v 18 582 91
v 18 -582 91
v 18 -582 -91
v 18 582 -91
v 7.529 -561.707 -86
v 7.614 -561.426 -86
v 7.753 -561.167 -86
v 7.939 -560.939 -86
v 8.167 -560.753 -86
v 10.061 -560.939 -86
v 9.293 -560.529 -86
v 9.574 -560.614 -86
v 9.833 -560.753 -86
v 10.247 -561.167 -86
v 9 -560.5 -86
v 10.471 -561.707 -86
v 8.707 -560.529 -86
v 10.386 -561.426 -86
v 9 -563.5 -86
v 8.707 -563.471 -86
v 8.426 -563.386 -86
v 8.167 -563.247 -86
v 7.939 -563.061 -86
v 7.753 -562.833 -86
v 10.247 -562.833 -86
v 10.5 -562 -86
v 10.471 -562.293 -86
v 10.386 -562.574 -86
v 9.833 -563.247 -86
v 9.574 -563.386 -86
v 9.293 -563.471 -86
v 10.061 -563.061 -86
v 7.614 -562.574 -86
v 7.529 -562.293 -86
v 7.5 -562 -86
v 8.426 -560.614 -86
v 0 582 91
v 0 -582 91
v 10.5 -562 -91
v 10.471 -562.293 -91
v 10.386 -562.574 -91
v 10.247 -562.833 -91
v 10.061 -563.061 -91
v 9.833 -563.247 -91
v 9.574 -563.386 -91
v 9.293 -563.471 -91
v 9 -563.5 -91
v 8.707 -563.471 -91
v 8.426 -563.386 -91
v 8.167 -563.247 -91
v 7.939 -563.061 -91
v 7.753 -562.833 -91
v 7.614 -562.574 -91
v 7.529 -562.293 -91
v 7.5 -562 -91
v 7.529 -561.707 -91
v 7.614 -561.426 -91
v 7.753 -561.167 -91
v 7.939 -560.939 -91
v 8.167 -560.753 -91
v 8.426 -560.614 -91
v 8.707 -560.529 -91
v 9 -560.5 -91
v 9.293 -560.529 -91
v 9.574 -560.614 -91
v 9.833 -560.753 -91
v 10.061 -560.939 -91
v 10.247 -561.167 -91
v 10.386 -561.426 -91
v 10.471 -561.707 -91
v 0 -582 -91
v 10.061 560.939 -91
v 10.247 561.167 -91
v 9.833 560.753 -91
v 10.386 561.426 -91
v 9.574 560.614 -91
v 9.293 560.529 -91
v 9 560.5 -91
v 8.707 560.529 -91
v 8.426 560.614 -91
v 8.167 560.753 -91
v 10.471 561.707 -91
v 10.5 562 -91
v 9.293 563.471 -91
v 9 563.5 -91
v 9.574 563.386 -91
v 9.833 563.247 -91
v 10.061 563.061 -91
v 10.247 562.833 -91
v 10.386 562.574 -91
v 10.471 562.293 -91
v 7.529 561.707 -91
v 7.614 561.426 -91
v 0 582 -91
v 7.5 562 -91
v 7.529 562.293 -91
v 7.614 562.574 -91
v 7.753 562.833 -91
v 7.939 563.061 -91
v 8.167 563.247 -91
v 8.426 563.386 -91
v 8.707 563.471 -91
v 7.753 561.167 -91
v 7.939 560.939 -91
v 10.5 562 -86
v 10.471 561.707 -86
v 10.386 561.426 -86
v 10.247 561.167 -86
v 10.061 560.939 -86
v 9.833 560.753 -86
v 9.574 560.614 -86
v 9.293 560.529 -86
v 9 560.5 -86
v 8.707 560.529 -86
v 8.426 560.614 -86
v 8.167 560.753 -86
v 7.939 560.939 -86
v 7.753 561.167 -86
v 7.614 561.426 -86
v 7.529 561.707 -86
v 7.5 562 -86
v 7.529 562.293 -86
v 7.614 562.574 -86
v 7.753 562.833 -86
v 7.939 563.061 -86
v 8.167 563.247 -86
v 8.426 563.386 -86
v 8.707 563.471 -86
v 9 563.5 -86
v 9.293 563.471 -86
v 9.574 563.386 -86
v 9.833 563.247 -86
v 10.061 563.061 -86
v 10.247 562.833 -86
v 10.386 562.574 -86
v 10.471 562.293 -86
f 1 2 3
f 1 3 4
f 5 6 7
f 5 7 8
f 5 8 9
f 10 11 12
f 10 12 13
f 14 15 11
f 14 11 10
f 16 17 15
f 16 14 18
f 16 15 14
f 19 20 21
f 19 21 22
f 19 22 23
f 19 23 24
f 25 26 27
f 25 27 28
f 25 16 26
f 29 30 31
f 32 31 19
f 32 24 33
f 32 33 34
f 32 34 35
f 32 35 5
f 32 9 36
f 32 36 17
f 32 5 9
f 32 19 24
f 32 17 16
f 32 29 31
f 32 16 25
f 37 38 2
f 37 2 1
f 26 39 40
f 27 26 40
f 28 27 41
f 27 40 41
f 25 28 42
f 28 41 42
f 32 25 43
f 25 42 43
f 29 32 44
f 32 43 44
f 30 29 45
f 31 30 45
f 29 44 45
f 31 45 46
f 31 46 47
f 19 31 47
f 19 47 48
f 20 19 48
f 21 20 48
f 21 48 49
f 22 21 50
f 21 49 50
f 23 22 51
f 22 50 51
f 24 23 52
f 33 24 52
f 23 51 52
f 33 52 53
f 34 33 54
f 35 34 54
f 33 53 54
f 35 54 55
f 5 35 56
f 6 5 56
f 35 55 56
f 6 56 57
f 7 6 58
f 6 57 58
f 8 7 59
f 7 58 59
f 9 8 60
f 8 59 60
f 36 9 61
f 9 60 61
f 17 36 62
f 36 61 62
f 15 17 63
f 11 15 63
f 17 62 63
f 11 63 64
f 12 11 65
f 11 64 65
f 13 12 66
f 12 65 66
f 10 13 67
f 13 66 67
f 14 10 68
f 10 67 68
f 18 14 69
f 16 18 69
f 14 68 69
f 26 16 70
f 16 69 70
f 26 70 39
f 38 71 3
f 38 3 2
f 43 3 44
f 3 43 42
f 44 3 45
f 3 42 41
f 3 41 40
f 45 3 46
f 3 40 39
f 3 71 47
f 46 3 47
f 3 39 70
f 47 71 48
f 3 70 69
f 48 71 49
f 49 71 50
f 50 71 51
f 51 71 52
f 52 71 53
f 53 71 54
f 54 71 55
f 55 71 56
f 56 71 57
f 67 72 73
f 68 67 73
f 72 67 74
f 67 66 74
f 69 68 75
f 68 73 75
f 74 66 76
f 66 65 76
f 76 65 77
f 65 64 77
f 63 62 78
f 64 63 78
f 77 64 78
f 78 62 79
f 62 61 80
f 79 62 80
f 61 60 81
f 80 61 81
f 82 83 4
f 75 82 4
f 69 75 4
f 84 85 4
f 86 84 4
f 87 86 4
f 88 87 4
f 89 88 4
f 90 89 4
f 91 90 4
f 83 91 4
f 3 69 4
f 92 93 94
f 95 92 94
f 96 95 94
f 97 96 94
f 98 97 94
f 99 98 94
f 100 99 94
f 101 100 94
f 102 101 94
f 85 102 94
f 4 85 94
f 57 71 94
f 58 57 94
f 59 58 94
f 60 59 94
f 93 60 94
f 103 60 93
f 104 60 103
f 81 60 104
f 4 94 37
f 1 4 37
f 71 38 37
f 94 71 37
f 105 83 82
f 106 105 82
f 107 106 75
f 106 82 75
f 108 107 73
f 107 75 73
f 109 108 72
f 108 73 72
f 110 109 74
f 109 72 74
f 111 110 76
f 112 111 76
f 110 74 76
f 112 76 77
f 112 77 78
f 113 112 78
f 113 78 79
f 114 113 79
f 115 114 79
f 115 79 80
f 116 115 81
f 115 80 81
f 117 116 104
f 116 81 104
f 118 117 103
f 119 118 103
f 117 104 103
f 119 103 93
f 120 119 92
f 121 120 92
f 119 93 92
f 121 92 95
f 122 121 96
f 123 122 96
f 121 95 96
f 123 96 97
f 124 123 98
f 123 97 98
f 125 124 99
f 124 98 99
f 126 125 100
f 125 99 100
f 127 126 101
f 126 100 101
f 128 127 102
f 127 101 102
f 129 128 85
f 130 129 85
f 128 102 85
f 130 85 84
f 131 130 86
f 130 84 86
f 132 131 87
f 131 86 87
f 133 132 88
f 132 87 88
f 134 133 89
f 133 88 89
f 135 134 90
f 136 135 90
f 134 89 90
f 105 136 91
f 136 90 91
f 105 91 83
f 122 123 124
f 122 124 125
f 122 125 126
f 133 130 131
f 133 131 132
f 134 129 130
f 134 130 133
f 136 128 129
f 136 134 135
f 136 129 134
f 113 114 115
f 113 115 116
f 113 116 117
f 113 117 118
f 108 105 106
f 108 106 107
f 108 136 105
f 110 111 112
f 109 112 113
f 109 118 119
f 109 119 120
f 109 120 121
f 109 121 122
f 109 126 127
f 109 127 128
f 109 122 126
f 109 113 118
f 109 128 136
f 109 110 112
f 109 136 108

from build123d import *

# Parameters (mm, degrees)
F0_W     = 1164
F0_H     = 182
F1_DEPTH = 18
F2_R     = 1.5
F3_DEPTH = 5


with BuildPart() as f1:
    # F0 (on Right) → F1 (new body)
    with BuildSketch(Plane.YZ):
        Rectangle(F0_W, F0_H)
    extrude(amount=F1_DEPTH)

    # F2 (on face) → F3 (cut)
    with BuildSketch(Plane(origin=(0, 0, -91), x_dir=(1, 0, 0), z_dir=(0, 0, -1))):
        with Locations((9, 562)):
            Circle(F2_R)
        with Locations((9, -562)):
            Circle(F2_R)
    extrude(amount=-F3_DEPTH, mode=Mode.SUBTRACT)


solid = f1.part
